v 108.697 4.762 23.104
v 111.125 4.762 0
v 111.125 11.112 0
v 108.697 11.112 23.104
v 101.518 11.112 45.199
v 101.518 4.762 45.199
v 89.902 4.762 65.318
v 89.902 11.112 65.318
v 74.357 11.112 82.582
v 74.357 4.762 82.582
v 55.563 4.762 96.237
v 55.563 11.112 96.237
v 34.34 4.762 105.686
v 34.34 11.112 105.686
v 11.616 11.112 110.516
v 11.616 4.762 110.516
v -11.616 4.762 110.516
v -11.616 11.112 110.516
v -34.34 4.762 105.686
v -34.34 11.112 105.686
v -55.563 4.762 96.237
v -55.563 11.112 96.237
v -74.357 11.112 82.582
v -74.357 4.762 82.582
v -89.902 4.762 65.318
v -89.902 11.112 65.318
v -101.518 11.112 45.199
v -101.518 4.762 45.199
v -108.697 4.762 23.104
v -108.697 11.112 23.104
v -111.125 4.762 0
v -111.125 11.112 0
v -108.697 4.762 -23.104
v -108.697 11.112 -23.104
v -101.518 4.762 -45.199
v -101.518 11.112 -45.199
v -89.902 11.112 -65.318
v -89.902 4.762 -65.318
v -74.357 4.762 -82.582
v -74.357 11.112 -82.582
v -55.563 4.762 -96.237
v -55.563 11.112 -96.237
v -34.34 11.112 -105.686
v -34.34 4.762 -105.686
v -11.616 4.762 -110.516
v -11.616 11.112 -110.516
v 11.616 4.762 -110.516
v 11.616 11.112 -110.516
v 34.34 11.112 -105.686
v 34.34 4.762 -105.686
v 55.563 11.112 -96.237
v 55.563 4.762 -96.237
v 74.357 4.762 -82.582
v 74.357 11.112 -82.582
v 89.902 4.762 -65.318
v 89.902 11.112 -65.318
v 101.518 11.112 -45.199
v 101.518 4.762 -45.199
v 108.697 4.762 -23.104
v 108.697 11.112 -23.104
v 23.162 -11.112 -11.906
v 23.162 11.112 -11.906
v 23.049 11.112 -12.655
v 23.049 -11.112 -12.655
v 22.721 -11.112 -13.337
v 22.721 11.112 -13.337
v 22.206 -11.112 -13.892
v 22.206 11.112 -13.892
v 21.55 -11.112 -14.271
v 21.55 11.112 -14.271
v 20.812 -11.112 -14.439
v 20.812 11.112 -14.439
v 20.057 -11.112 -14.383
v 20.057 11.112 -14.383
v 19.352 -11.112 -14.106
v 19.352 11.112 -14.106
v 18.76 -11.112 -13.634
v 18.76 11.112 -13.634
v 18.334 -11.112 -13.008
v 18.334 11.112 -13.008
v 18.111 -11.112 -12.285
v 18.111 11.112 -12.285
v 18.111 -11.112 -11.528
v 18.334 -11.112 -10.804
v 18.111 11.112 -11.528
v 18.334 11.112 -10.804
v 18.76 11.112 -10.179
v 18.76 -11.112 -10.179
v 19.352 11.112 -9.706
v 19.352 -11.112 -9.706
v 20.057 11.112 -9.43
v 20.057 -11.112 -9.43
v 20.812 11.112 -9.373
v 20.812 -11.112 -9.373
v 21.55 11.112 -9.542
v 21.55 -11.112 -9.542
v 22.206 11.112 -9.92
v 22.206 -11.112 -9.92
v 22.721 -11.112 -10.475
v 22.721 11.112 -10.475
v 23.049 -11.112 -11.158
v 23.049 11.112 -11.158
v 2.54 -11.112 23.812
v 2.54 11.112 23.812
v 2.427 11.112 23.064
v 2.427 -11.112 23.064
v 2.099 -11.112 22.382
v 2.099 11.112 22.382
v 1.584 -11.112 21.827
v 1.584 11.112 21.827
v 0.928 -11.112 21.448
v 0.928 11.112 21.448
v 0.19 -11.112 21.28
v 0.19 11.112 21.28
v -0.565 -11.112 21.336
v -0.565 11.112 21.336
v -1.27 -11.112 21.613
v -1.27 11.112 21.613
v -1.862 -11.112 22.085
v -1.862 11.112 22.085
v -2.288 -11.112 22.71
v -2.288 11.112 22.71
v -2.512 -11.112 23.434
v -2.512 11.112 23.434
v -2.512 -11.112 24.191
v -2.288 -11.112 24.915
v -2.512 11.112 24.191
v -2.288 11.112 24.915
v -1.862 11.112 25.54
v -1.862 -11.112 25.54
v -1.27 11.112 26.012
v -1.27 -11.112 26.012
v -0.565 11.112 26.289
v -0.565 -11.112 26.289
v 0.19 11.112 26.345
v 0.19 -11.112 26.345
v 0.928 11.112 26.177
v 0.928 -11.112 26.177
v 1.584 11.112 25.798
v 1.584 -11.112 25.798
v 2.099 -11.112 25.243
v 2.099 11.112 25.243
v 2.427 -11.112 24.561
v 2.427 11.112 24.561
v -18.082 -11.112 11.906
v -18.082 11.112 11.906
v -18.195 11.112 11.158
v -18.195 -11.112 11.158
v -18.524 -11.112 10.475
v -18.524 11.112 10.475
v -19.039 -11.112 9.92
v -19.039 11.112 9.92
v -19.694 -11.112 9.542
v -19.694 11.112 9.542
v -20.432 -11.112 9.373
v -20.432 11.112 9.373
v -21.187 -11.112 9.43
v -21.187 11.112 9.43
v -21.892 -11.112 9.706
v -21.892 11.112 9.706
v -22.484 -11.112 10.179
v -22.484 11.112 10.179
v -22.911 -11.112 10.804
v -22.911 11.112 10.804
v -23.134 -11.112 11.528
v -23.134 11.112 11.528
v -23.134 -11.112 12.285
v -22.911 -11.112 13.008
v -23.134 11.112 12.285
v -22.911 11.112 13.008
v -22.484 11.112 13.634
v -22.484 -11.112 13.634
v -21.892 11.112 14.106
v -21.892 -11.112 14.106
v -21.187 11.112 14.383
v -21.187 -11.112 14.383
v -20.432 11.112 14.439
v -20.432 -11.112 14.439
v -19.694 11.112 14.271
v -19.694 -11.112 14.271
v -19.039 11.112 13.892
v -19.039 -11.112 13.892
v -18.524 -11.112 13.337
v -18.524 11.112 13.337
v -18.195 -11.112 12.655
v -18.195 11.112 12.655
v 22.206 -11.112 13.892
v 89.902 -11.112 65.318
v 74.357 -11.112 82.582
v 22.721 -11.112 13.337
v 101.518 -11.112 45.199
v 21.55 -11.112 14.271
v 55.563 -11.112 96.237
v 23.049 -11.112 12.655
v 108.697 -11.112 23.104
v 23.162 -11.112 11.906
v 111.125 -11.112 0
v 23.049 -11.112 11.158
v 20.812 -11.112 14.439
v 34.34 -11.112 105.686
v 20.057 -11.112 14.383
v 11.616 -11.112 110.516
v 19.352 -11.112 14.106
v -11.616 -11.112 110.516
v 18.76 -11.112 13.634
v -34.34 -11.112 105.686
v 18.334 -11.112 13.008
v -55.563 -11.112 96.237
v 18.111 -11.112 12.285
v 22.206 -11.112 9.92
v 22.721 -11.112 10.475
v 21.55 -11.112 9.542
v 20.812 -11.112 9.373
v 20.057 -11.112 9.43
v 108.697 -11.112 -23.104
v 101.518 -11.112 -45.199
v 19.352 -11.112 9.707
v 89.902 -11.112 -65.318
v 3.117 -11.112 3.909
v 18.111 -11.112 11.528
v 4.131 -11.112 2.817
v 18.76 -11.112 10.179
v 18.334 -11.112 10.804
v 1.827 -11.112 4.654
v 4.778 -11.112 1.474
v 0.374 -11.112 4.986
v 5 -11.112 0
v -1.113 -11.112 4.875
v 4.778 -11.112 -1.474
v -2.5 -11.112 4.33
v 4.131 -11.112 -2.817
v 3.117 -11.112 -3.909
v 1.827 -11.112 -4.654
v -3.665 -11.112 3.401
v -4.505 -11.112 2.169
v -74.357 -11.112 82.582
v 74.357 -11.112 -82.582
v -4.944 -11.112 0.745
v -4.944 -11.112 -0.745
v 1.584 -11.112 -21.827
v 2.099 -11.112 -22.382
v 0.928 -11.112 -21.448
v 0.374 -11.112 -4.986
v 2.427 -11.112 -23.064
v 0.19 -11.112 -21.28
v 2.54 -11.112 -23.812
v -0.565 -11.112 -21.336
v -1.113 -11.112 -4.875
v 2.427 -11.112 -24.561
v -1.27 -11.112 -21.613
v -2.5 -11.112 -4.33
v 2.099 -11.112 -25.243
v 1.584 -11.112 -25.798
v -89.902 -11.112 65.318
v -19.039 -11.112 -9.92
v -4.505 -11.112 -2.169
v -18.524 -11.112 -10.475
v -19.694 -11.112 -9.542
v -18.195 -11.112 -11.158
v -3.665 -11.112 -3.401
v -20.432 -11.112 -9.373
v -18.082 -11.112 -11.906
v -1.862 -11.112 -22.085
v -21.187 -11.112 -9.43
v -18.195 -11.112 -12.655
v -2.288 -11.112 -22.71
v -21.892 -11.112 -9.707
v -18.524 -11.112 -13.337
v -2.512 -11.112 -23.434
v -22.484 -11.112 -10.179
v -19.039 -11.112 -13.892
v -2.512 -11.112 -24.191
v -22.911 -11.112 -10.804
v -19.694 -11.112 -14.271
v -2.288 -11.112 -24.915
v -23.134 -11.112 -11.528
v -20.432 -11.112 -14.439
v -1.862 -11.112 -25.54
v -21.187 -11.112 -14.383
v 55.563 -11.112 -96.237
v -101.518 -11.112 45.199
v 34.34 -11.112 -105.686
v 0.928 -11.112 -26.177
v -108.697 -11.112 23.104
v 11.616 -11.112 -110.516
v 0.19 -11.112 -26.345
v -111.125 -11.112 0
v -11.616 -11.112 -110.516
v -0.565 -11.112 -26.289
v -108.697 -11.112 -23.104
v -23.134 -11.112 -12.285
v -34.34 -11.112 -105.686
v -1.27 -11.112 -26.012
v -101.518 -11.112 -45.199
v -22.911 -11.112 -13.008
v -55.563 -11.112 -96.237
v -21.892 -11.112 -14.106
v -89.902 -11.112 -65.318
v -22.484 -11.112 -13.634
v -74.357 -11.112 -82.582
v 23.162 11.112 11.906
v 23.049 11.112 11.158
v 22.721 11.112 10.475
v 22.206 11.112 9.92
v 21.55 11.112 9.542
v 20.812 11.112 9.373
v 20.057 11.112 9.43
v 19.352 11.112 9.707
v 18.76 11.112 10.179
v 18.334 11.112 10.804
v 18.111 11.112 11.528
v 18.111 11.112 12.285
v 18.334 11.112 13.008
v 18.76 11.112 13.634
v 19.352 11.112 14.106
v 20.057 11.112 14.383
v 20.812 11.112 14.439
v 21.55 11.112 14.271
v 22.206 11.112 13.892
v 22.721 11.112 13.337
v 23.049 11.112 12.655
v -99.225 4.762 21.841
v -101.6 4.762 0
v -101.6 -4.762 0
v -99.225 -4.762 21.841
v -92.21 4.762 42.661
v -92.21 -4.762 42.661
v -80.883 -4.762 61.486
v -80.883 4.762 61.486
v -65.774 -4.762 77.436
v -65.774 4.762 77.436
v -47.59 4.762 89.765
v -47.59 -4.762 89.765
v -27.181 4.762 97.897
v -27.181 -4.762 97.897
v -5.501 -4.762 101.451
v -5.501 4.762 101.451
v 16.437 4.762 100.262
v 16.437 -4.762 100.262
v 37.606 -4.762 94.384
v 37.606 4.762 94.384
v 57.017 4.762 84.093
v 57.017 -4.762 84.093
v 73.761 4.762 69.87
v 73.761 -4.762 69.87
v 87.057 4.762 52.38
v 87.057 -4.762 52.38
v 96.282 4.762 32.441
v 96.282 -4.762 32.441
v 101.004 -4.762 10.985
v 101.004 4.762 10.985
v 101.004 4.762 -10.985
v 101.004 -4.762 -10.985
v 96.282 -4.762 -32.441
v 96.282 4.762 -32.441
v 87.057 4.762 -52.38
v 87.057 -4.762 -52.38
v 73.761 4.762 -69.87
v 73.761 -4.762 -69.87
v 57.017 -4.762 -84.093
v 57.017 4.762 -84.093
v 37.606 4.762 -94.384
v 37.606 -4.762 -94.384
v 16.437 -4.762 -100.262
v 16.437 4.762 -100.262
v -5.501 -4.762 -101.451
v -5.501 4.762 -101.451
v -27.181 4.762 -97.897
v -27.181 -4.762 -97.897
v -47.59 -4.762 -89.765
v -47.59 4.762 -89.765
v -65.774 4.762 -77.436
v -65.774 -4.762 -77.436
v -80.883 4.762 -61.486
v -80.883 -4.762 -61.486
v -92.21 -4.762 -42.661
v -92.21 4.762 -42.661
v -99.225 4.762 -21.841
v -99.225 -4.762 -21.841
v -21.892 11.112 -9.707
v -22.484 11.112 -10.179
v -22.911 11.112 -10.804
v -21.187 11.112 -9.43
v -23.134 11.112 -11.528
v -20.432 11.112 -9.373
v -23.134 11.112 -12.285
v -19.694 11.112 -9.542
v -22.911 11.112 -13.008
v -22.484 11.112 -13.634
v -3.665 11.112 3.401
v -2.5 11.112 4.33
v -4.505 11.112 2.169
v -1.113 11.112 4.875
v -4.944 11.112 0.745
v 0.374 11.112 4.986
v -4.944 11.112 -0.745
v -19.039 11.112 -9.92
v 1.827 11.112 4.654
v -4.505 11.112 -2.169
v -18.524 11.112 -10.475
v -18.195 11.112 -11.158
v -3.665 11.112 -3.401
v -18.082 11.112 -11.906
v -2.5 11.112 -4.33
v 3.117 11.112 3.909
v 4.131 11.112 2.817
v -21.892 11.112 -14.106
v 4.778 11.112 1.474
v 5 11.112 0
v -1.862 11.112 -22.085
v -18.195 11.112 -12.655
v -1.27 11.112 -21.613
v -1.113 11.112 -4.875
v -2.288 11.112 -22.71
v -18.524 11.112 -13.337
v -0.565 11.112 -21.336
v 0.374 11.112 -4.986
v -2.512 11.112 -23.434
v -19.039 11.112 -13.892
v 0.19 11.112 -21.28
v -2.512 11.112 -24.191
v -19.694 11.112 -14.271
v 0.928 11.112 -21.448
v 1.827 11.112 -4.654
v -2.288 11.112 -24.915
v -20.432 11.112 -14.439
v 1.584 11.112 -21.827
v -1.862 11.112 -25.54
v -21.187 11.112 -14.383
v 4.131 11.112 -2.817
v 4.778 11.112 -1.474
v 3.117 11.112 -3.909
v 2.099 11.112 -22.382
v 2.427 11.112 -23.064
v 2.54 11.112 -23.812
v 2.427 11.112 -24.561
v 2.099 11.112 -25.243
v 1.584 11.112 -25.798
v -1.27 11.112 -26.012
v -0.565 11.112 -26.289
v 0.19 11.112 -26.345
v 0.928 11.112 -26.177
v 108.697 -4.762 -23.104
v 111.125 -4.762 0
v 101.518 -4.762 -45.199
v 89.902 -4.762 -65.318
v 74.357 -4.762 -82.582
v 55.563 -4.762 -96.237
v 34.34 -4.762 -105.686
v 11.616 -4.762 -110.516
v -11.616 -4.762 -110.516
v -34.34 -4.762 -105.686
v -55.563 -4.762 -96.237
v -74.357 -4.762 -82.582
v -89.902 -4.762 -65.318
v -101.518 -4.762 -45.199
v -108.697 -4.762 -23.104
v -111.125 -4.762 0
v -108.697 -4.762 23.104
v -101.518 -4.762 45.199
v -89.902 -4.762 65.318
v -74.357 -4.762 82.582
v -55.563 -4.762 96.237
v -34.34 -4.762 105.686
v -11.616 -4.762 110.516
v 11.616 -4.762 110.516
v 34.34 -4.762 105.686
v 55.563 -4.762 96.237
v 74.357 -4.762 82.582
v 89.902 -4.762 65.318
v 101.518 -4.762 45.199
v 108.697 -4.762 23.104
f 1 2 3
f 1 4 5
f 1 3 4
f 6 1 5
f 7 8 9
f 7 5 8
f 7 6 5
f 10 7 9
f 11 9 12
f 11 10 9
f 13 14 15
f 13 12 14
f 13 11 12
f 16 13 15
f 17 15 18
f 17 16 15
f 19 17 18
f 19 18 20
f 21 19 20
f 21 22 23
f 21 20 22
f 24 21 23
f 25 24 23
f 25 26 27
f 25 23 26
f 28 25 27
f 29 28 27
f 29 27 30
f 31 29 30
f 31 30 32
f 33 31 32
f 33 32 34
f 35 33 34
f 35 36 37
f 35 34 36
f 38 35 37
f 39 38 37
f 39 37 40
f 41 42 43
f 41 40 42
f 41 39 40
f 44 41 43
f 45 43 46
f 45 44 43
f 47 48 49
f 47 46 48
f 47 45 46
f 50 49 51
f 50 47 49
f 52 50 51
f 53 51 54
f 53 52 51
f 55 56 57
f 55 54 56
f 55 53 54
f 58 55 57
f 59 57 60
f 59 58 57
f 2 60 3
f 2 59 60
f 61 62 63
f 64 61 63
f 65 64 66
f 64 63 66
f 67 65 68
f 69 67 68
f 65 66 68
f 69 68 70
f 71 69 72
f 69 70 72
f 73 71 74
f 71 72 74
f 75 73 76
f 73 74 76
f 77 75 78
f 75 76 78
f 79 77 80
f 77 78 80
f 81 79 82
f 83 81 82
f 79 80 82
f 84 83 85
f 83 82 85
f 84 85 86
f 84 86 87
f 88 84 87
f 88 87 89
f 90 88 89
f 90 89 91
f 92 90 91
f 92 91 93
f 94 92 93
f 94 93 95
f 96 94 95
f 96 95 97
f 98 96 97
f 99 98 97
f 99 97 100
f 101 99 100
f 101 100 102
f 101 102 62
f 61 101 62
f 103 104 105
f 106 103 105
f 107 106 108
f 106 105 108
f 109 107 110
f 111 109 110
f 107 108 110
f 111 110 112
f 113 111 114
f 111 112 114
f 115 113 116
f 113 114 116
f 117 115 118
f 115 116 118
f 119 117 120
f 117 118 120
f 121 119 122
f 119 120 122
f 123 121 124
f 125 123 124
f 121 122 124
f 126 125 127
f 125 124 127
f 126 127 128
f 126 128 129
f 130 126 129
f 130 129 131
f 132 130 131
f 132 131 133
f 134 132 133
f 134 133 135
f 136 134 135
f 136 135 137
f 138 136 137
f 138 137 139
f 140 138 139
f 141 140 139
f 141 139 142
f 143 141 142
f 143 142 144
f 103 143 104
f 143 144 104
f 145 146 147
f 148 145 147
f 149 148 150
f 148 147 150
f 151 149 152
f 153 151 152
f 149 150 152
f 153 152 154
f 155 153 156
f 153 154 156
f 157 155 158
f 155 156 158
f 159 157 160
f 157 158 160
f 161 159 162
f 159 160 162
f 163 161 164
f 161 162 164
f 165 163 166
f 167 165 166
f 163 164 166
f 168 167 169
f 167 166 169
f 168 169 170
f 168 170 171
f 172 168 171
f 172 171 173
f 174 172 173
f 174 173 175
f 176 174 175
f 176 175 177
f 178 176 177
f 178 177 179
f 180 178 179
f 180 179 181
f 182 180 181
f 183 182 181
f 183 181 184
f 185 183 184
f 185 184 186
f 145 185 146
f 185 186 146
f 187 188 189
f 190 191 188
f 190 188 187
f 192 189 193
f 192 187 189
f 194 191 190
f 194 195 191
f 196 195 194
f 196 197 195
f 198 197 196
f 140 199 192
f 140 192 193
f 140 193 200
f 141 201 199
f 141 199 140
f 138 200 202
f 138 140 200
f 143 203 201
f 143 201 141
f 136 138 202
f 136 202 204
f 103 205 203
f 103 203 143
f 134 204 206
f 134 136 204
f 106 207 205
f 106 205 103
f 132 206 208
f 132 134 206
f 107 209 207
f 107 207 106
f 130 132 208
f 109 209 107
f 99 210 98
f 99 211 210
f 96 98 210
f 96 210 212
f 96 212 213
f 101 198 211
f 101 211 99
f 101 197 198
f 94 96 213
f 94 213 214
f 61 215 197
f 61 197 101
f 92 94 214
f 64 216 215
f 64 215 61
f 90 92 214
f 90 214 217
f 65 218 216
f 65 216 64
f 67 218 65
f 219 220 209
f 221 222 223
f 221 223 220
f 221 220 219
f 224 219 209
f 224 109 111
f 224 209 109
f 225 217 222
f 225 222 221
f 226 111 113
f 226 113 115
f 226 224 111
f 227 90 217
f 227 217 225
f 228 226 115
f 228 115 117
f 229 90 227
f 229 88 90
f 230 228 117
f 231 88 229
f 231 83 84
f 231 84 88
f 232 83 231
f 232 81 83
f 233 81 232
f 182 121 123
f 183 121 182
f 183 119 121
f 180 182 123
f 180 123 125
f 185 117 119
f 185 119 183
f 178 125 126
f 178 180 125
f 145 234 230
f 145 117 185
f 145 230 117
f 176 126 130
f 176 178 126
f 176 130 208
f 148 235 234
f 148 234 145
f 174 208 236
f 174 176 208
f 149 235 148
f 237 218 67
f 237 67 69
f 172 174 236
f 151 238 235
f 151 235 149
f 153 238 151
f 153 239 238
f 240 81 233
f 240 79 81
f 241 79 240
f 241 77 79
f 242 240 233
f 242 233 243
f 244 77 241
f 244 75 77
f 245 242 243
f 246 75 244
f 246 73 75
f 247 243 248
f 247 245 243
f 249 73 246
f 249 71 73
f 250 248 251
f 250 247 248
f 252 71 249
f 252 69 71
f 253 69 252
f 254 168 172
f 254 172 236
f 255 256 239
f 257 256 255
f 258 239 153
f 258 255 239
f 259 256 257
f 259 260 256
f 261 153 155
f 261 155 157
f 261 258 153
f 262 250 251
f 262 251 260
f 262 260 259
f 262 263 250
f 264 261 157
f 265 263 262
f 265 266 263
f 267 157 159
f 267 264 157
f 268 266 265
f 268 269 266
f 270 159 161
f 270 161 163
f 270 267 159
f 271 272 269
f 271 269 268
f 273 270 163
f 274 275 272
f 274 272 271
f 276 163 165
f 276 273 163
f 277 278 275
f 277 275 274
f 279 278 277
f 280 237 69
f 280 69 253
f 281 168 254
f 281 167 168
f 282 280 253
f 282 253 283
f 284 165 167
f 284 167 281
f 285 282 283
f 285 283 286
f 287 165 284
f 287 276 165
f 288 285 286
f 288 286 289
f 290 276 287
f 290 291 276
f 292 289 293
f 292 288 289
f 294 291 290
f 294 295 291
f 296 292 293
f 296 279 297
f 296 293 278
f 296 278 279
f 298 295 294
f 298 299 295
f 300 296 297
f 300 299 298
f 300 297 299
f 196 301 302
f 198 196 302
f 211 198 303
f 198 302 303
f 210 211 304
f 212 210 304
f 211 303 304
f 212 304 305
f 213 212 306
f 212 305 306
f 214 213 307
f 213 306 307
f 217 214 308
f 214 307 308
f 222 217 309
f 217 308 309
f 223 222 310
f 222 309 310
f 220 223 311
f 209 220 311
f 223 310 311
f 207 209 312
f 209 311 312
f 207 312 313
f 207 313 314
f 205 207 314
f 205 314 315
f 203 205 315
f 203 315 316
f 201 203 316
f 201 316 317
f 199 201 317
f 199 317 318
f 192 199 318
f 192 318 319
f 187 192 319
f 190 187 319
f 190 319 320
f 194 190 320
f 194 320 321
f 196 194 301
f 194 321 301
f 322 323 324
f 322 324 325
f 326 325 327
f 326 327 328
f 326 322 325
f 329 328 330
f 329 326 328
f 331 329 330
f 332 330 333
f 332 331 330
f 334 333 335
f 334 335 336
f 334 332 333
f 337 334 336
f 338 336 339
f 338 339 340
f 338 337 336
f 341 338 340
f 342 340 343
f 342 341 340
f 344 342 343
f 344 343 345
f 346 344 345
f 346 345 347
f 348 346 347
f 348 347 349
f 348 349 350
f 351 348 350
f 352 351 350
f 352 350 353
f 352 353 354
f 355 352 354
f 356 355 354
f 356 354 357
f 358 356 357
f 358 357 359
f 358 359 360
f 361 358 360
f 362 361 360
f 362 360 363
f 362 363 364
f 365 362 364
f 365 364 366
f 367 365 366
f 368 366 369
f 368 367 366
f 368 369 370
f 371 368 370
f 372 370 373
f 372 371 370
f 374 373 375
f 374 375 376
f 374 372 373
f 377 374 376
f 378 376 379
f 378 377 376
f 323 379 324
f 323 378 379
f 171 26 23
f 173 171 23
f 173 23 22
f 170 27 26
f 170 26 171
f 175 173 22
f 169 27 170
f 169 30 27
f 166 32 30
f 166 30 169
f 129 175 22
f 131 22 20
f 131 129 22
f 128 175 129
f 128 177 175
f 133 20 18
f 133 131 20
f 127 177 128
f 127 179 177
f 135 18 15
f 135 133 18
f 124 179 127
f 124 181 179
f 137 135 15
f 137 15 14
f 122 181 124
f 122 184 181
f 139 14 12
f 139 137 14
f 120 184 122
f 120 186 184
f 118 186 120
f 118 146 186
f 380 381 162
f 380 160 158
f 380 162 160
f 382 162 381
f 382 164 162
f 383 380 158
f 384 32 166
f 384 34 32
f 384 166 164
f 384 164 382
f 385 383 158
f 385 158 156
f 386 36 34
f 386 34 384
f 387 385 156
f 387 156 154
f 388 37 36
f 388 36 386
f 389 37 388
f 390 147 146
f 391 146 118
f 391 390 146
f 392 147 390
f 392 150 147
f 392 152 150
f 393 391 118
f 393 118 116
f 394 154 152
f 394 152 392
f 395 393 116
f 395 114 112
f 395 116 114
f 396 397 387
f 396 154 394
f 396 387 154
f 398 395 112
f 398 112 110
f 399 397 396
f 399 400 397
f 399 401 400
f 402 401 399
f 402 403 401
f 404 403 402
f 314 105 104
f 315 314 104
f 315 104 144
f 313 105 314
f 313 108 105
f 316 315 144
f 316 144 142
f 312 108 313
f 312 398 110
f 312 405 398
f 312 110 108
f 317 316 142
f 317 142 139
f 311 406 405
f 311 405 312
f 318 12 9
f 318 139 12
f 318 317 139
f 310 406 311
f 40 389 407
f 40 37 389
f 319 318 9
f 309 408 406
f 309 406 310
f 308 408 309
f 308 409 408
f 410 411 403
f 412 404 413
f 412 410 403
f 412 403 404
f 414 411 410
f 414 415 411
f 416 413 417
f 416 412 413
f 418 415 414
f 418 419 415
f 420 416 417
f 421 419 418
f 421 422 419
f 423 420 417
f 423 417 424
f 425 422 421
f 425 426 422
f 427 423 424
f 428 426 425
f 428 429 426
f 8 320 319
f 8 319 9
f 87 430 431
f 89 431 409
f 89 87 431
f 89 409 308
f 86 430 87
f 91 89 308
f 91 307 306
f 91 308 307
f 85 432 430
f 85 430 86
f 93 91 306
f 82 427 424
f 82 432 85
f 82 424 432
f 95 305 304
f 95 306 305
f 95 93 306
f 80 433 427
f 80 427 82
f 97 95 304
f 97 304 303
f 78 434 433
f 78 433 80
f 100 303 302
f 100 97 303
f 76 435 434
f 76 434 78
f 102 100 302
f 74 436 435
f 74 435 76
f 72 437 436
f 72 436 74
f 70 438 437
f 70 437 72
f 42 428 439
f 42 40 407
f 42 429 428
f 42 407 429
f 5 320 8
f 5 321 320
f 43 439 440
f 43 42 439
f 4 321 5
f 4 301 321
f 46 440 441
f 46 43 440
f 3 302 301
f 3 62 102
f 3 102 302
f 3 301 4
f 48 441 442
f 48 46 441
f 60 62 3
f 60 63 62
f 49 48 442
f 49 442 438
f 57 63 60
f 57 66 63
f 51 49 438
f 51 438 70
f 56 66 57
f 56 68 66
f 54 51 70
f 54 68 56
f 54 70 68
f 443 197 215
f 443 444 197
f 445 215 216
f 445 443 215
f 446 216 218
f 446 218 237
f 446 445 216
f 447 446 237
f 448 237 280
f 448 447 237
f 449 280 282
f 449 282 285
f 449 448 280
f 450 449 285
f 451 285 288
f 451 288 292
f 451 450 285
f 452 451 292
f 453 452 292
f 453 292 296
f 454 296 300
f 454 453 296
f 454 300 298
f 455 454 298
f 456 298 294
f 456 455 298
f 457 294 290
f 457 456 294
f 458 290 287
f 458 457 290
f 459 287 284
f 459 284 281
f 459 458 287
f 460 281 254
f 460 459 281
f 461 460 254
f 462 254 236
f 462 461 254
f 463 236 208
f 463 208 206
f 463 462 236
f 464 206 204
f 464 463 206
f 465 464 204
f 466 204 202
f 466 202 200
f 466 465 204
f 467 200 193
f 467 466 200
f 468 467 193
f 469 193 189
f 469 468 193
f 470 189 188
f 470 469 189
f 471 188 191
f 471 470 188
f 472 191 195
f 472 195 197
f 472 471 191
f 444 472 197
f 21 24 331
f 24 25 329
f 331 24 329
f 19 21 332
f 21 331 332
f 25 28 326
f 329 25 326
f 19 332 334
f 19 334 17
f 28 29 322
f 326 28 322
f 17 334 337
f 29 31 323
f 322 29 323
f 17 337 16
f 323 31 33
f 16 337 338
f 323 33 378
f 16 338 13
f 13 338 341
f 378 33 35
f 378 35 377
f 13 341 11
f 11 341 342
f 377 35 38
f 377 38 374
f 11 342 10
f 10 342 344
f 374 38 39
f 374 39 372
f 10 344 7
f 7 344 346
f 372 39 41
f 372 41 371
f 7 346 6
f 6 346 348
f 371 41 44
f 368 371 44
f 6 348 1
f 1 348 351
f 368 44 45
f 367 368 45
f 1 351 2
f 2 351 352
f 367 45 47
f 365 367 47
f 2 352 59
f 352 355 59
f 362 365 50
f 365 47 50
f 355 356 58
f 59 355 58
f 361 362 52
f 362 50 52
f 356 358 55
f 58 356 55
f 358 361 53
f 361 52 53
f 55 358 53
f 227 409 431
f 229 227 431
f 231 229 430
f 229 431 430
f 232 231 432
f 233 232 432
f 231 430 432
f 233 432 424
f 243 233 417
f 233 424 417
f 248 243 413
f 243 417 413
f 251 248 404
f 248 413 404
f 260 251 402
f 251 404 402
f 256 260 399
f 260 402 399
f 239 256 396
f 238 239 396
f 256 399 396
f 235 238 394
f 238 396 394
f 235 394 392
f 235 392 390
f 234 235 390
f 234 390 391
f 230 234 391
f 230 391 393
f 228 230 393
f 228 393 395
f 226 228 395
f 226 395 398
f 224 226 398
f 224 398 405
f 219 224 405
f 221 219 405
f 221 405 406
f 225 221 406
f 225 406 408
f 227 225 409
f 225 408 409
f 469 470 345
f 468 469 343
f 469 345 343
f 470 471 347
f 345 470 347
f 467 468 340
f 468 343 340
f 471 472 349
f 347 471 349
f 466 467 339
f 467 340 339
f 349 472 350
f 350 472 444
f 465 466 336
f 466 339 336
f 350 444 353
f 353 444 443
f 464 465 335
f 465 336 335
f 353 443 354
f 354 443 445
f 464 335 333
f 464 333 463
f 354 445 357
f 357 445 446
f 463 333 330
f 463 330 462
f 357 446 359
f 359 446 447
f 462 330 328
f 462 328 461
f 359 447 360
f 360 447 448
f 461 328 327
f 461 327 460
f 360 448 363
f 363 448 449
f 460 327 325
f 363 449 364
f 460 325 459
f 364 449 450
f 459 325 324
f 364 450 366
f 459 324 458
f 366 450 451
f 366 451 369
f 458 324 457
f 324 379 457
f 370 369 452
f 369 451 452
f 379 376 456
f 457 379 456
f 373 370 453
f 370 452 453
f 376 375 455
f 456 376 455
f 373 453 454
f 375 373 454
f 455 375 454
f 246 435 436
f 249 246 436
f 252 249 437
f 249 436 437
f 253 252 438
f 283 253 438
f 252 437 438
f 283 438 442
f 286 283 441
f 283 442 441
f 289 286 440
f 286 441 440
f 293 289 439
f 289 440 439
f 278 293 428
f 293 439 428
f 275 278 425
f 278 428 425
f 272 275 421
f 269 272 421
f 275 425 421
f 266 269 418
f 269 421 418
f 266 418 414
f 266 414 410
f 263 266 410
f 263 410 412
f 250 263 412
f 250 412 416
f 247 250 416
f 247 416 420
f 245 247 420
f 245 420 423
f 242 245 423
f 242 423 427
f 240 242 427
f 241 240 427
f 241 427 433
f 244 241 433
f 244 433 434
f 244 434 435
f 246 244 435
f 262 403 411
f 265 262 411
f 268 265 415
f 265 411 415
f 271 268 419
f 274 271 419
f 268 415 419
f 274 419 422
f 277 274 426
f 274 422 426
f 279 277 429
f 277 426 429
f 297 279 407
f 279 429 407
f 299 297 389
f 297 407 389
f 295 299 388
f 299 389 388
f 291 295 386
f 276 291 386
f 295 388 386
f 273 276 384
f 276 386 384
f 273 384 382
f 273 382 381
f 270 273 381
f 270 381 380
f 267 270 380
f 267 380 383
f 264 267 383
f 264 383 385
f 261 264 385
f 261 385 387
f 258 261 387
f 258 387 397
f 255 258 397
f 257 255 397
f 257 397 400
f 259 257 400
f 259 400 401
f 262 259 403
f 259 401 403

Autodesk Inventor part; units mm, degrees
ref_plane "YZ Plane" through (0, 0, 0) normal (1, 0, 0) x (0, 1, 0)
ref_plane "XY Plane" through (0, 0, 0) normal (0, 0, 1) x (1, 0, 0)
sketch "Sketch1" plane through (0, 0, 0) normal (0, 1, 0) x (-1, 0, 0)
  circle A0 centre (0, 0) radius 101.6
  dimension "d0" = 203.2
extrude "Extrusion1" add sketch "Sketch1" along normal mid plane 9.525
sketch "Sketch2" plane through (0, 4.7625, 0) normal (0, 1, 0) x (1, 0, 0)
  circle A0 centre (0, 0) radius 111.125
  dimension "d3" = 222.25
extrude "Extrusion2" add sketch "Sketch2" along normal blind 6.35
mirror "Mirror1" about plane through (0, 0, 0) normal (0, 1, 0) of "Extrusion2"
sketch "Sketch4" plane through (0, 11.1125, 0) normal (0, 1, 0) x (1, 0, 0)
  circle A0 centre (0, 23.8125) radius 2.54
  circle A1 centre (-20.6222, 11.9063) radius 2.54
  circle A2 centre (-20.6222, -11.9062) radius 2.54
  circle A3 centre (0, -23.8125) radius 2.54
  circle A4 centre (20.6222, -11.9063) radius 2.54
  circle A5 centre (20.6222, 11.9062) radius 2.54
  point P0 (0, 0)
  dimension "d6" = 5.08
  dimension "d7" = 23.8125
  dimension "d10" = 360
extrude "Extrusion3" cut sketch "Sketch4" against normal through all
sketch "Sketch5" plane through (0, 11.1125, 0) normal (0, 1, 0) x (1, 0, 0)
  circle A0 centre (0, 0) radius 5
  dimension "d14" = 10
extrude "Extrusion4" cut sketch "Sketch5" against normal through all
equation "\"d0\" = innerDiam"
equation "\"d1\" = innerWidth"
equation "\"d3\" = outerDiam"
equation "\"d4\" = outerWidth"
equation "\"d12\" = outerWidth"
equation "\"d15\" = outerWidth"
equation "\"innerDiam\" = 203.2"
equation "\"innerRadius\" = 0.5 * innerDiam"
equation "\"outerDiam\" = 2 * outerRadius"
equation "\"innerWidth\" = 9.525"
equation "\"outerWidth\" = 6.35"
equation "\"outerRadius\" = 111.125"
properties part number "WoodPully"
